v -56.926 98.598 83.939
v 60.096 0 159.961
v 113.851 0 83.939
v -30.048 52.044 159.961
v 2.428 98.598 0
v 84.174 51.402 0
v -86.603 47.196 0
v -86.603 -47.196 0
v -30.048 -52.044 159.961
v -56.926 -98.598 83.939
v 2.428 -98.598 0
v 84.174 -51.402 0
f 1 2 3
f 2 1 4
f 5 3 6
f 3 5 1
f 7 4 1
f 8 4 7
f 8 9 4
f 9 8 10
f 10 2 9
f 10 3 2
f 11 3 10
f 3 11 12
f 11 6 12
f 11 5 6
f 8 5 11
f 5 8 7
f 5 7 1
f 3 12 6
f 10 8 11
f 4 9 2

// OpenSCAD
$fn =3;

inner_edge = 300;
clip_edge = inner_edge * (13/8);




module tetrahedron(edge){
    ht = sqrt(2/3)*edge;
    rad = edge/(sqrt(3));

    cylinder(h=ht,r1=rad,r2=0);
}

intersection(){
    tetrahedron(inner_edge);
    translate([0,0,clip_edge * (21/64)]){
        rotate(180,[0,1,0]){
            tetrahedron(clip_edge);
        }
    }
}
